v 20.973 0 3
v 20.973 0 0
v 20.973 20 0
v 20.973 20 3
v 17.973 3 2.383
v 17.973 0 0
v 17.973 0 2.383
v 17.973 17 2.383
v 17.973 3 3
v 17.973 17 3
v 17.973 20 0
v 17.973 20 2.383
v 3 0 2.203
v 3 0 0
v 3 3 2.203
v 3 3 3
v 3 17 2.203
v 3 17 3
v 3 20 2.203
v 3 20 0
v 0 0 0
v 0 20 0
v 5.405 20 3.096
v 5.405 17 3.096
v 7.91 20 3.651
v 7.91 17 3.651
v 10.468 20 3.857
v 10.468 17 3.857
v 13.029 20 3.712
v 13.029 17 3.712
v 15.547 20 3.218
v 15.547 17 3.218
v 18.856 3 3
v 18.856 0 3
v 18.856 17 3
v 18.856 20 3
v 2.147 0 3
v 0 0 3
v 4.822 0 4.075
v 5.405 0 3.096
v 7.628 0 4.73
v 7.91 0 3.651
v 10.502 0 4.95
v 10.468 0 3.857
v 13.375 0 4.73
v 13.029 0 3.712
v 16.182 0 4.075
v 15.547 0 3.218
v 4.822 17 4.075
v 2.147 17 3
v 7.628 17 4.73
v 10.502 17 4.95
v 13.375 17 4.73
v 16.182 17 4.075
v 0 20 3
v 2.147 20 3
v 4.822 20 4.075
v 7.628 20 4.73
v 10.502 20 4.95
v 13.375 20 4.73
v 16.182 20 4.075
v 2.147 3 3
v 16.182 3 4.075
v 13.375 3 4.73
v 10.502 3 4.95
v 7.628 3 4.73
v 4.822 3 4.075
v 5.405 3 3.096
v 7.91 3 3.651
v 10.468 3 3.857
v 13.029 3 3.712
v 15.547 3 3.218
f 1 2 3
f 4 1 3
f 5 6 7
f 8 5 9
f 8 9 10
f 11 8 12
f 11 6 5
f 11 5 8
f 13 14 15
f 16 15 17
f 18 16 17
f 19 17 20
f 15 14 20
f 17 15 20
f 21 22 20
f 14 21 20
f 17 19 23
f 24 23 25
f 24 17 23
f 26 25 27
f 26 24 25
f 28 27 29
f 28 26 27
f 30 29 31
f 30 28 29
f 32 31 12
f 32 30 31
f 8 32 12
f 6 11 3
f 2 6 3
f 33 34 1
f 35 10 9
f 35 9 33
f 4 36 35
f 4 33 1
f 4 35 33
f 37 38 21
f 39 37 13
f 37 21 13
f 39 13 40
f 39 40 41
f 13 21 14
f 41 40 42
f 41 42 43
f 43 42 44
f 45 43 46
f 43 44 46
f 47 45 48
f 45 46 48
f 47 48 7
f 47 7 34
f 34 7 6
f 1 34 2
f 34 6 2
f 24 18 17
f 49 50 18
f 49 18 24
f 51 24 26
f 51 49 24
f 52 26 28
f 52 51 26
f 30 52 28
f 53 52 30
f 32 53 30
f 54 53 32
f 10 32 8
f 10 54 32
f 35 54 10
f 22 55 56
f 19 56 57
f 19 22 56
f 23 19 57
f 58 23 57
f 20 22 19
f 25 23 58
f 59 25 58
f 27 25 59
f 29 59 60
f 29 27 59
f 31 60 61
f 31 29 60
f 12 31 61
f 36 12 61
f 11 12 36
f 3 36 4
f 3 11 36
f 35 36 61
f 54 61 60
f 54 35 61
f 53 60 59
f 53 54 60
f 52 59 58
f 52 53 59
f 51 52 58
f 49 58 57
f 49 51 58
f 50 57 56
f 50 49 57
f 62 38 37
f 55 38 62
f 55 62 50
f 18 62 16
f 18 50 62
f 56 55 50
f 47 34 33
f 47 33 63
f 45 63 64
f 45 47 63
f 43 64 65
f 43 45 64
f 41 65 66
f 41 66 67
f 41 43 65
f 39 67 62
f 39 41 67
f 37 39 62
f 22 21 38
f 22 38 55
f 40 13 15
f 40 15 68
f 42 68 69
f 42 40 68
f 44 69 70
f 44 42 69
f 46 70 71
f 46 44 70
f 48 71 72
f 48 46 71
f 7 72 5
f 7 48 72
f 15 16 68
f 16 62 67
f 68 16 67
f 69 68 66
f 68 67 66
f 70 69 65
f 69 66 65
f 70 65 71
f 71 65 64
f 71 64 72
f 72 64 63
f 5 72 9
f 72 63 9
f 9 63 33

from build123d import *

# Parameters (mm, degrees)
F0_W     = 3
F0_H     = 20
F1_DEPTH = 3
F3_DEPTH = 3
F4_START = -17
F4_DEPTH = 3


with BuildPart() as f1:
    # F0 (on Top) → F1 (new body)
    with BuildSketch(Plane.XY):
        with Locations((1.5, 10)):
            Rectangle(F0_W, F0_H)
    extrude(amount=F1_DEPTH)



with BuildPart() as f1b:
    # F0 (on Top) → F1, piece 2 (new body)
    with BuildSketch(Plane.XY):
        with Locations((19.4732441902, 10)):
            Rectangle(F0_W, F0_H)
    extrude(amount=F1_DEPTH)


with BuildPart() as f1_1:
    add(f1.part)

    add(f1b.part)  # F3 merges F1b
    # F2 (on Front) → F3 (join)
    with BuildSketch(Plane.XZ):
        with BuildLine():
            ThreePointArc((2.9794946313, 2.1942069288), (10.4704971824, 3.8575045035), (17.9987903684, 2.37208209))
            Line((17.9987903684, 2.37208209), (18.889406696, 2.9833931476))
            ThreePointArc((18.889406696, 2.9833931476), (10.4870498812, 4.9495737182), (2.087746514, 2.970389789))
            Line((2.087746514, 2.970389789), (2.9794946313, 2.1942069288))
        make_face()
    extrude(amount=-F3_DEPTH)

    # F2 (on Front) → F4 (join)
    with BuildSketch(Plane.XZ.offset(F4_START)):
        with BuildLine():
            ThreePointArc((2.9794946313, 2.1942069288), (10.4704971824, 3.8575045035), (17.9987903684, 2.37208209))
            Line((17.9987903684, 2.37208209), (18.889406696, 2.9833931476))
            ThreePointArc((18.889406696, 2.9833931476), (10.4870498812, 4.9495737182), (2.087746514, 2.970389789))
            Line((2.087746514, 2.970389789), (2.9794946313, 2.1942069288))
        make_face()
    extrude(amount=-F4_DEPTH)


solid = f1_1.part
